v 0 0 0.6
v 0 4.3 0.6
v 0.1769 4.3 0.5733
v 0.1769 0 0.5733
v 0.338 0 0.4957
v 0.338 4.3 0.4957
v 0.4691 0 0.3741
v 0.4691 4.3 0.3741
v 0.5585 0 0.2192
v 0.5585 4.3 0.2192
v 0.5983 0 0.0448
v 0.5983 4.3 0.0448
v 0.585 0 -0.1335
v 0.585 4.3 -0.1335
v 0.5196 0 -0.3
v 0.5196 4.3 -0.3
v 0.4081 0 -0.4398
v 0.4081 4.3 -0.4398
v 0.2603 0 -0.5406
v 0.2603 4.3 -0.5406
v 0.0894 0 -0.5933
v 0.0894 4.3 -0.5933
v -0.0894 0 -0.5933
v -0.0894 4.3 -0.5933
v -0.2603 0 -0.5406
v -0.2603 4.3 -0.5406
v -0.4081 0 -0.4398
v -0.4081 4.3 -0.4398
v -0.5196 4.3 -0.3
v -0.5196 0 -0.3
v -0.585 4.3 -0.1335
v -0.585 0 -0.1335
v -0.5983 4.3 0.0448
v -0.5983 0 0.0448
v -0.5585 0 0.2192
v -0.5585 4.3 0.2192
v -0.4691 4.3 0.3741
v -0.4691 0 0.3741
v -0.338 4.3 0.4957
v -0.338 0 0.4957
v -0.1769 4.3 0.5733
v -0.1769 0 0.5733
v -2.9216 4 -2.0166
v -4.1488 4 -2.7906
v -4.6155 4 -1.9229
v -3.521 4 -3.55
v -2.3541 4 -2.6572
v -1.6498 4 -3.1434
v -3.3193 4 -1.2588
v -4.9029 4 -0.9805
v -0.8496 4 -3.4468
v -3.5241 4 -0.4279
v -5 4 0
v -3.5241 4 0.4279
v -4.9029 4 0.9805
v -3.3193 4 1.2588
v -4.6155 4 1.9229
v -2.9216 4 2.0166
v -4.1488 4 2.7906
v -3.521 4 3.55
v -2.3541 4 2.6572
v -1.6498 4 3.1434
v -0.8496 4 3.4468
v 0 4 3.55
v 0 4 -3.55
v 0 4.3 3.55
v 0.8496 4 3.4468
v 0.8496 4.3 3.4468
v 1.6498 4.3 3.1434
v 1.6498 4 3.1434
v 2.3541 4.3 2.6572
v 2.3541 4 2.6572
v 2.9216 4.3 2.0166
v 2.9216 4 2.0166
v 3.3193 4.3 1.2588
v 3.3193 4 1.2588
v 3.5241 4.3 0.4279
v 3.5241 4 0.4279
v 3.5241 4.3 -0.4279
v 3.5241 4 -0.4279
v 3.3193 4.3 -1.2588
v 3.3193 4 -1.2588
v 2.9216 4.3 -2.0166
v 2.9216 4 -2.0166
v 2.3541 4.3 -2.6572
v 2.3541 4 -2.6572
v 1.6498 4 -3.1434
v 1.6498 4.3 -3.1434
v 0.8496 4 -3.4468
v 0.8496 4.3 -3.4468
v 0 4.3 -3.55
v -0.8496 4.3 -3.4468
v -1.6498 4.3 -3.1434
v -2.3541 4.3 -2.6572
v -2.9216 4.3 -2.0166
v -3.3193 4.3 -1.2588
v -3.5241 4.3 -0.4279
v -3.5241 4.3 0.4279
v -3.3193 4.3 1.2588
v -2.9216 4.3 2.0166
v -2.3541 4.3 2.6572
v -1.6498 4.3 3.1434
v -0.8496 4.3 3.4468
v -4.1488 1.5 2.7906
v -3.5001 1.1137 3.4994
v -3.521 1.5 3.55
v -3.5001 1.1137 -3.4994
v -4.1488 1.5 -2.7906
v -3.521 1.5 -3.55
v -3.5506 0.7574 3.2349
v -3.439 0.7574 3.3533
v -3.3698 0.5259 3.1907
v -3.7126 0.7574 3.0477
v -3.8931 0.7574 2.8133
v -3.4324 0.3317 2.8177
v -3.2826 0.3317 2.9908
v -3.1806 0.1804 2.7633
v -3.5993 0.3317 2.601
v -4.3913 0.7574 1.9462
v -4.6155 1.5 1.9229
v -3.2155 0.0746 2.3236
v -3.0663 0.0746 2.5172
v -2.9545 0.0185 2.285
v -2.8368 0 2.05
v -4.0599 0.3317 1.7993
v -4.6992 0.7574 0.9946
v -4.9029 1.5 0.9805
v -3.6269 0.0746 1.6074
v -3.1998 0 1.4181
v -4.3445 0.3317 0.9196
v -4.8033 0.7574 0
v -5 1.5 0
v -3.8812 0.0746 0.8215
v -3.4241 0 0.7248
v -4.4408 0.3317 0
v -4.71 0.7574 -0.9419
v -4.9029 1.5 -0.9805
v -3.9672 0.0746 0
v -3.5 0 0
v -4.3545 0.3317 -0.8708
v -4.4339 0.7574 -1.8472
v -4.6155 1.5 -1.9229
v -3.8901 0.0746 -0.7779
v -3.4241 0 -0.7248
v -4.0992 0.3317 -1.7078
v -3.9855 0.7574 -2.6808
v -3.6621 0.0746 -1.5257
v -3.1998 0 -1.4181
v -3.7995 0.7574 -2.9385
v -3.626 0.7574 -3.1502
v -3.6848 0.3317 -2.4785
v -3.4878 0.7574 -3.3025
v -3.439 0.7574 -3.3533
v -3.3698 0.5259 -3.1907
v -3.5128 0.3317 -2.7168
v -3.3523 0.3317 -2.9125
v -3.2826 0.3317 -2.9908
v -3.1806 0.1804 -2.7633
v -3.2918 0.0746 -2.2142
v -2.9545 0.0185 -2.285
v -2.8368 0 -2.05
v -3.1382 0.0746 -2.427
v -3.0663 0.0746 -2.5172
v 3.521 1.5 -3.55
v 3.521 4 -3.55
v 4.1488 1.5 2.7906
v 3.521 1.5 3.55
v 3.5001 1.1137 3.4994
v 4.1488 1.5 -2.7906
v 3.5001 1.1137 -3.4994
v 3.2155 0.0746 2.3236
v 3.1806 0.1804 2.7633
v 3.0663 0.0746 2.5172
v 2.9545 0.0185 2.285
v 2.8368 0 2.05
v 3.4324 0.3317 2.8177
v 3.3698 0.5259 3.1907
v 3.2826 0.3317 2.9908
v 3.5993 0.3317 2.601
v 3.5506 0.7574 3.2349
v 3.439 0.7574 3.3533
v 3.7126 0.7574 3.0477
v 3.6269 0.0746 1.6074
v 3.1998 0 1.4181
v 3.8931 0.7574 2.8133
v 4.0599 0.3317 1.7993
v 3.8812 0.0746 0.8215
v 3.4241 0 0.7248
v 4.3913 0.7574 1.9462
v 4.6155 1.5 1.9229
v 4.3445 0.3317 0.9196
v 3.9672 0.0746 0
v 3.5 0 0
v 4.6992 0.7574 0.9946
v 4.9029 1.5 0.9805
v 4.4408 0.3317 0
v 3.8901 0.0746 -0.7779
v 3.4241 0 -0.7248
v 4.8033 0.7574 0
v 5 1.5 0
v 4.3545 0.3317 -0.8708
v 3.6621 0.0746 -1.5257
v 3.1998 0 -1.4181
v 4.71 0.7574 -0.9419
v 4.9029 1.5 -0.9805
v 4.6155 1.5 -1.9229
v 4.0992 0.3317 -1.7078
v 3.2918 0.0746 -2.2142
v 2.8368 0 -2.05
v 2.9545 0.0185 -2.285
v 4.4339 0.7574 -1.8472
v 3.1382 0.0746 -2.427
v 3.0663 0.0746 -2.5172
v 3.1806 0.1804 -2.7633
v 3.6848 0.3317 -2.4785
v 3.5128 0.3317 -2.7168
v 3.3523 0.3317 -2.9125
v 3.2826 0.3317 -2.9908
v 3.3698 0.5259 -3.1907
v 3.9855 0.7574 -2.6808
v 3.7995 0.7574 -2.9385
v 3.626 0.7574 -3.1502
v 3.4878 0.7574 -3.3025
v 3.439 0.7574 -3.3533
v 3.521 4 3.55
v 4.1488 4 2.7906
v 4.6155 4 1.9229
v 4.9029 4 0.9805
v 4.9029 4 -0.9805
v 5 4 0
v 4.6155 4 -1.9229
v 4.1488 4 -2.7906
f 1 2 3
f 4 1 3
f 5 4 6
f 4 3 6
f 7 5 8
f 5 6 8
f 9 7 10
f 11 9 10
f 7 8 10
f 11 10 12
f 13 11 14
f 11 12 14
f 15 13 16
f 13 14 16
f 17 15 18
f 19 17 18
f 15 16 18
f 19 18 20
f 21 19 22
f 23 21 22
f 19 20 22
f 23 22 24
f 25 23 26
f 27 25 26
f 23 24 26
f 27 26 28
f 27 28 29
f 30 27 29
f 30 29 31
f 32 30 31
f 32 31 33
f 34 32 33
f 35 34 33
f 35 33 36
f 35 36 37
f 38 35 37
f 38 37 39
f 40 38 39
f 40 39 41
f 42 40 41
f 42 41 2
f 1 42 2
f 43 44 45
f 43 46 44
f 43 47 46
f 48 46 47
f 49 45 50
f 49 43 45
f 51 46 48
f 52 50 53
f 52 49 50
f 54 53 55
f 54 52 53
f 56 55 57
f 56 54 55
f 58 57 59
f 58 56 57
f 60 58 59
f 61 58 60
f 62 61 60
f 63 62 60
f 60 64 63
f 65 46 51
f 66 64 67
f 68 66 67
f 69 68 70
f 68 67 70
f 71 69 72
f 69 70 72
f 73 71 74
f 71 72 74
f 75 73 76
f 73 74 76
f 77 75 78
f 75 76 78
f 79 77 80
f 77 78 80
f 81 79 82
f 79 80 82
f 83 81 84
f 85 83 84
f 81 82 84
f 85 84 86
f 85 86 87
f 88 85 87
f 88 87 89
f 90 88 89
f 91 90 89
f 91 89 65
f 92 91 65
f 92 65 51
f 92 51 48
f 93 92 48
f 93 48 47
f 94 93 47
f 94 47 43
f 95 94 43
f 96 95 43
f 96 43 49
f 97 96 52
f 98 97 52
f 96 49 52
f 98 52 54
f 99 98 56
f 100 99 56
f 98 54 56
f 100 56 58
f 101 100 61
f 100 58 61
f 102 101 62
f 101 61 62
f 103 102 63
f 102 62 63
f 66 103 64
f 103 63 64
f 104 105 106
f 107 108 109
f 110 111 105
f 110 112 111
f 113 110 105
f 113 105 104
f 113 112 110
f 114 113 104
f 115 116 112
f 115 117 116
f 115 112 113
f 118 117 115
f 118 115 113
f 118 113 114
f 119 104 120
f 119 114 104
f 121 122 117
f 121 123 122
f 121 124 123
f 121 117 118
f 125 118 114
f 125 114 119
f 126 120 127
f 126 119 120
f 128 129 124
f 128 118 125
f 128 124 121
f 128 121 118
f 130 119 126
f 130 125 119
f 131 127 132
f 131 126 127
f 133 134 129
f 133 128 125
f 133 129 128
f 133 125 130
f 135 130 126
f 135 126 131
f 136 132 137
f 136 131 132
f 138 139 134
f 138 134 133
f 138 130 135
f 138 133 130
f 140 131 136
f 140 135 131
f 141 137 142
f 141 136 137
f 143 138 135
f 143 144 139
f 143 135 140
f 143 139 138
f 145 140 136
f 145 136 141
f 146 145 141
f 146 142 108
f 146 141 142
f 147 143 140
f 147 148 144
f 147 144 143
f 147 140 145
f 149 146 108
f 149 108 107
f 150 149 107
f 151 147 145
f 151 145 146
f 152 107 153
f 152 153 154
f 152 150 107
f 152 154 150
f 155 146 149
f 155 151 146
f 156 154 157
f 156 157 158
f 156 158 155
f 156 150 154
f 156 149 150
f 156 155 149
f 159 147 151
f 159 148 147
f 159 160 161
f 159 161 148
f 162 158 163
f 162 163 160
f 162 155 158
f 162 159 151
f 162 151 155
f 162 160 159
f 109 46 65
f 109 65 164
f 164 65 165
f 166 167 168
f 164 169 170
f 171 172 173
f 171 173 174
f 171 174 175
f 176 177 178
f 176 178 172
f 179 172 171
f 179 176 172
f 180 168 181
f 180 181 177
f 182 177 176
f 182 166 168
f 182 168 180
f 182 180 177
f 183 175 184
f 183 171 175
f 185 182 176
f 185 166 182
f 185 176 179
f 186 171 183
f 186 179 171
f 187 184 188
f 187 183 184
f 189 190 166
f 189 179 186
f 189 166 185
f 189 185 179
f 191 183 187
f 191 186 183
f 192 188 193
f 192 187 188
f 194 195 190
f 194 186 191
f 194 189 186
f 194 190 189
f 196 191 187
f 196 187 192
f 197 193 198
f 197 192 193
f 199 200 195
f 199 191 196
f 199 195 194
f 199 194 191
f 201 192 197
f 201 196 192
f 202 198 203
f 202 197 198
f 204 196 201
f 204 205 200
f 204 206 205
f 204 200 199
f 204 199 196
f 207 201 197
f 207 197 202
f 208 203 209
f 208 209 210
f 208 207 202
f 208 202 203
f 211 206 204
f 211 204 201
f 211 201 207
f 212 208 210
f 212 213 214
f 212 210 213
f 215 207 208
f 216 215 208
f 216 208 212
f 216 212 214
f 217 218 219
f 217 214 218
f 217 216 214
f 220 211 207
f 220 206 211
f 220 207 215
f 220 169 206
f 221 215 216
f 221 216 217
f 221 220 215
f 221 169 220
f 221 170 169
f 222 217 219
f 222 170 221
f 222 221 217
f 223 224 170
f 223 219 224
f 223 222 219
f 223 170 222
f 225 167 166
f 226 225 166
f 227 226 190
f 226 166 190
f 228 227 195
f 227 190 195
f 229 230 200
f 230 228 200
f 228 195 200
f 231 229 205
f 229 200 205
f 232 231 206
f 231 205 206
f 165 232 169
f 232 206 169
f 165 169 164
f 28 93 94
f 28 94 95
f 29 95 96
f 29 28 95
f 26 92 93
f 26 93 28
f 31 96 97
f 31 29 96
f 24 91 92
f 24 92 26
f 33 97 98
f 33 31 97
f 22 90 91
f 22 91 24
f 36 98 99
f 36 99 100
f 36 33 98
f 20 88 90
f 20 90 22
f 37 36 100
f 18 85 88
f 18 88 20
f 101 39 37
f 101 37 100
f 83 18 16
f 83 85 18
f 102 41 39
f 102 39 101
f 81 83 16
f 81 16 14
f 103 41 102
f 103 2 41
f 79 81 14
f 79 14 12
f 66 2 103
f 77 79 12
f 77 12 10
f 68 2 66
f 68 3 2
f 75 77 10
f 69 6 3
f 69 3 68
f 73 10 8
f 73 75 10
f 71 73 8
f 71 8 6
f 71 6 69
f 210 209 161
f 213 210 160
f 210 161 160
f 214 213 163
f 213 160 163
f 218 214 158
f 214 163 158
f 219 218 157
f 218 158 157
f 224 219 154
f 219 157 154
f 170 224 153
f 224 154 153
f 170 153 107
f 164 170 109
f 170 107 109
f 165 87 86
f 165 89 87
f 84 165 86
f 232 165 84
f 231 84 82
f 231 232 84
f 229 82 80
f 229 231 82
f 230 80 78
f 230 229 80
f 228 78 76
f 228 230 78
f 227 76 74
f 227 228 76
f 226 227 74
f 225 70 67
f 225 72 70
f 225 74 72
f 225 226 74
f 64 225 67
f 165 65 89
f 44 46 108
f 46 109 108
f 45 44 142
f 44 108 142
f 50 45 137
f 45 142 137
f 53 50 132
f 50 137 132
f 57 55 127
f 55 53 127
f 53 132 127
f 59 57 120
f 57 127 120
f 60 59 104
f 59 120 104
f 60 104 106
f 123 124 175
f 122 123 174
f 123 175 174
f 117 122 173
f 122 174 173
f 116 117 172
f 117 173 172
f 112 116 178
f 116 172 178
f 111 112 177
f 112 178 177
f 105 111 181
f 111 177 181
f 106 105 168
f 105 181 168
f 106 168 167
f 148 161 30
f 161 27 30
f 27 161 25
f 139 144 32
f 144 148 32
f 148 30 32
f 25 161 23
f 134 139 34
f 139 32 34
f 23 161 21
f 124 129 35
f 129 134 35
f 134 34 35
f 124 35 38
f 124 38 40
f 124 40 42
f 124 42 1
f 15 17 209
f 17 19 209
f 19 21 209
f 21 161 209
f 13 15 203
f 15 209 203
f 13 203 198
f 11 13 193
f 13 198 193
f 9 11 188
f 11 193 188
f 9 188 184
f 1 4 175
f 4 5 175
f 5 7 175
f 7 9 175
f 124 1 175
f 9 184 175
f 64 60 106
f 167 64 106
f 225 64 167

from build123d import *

# Parameters (mm, degrees)
SKETCH_1_R           = 5
EXTRUDE_1_DEPTH      = 4
SKETCH_2_R           = 3.55
EXTRUDE_2_DEPTH      = 0.3
SKETCH_3_R           = 0.6
CUT_EXTRUDE_1_DEPTH  = 9.275868534
SKETCH_4_OUTSIDE_W   = 14.956
SKETCH_4_OUTSIDE_H   = 14.956
SKETCH_4_OUTSIDE_W_2 = 10
SKETCH_4_OUTSIDE_H_2 = 7.1
CUT_EXTRUDE_2_DEPTH  = 9.124038405
FILLET_1_R           = 1.5


with BuildPart() as part:
    # 草图1 → 凸台-拉伸1 (new body)
    with BuildSketch(Plane(origin=(0, 0, 0), x_dir=(1, 0, 0), z_dir=(0, 1, 0))):
        with Locations(Location((0, 0, 0), (0, 0, 270))):
            Circle(SKETCH_1_R)
    extrude(amount=EXTRUDE_1_DEPTH)

    # 草图2 → 凸台-拉伸2 (add)
    with BuildSketch(Plane(origin=(0, 4, 0), x_dir=(1, 0, 0), z_dir=(0, 1, 0))):
        with Locations(Location((0, 0, 0), (0, 0, 270))):
            Circle(SKETCH_2_R)
    extrude(amount=EXTRUDE_2_DEPTH)

    # 草图3 → 切除-拉伸1 (cut, through all)
    with BuildSketch(Plane(origin=(0, 4.3, 0), x_dir=(1, 0, 0), z_dir=(0, 1, 0))):
        with Locations(Location((0, 0, 0), (0, 0, 270))):
            Circle(SKETCH_3_R)
    extrude(amount=-CUT_EXTRUDE_1_DEPTH, mode=Mode.SUBTRACT)

    # 草图4 outside → 切除-拉伸2 (cut, through all)
    with BuildSketch(Plane(origin=(0, 4, 0), x_dir=(1, 0, 0), z_dir=(0, 1, 0))):
        Rectangle(SKETCH_4_OUTSIDE_W, SKETCH_4_OUTSIDE_H)
        Rectangle(SKETCH_4_OUTSIDE_W_2, SKETCH_4_OUTSIDE_H_2, mode=Mode.SUBTRACT)
    extrude(amount=-CUT_EXTRUDE_2_DEPTH, mode=Mode.SUBTRACT)

    # 圆角1
    # the kernel refuses this fillet: 1.5 mm, written as the material it takes off along each edge
    with BuildSketch(Plane(origin=(0, 0, 0), x_dir=(-0.03098871975283517, 0, 0.9995197342964671), z_dir=(0.9995197342964671, 0, 0.03098871975283517))) as fillet_1_piece_1:
        with BuildLine():
            CenterArc((5 - FILLET_1_R, -FILLET_1_R), FILLET_1_R, 0, 90)
            Line((5 - FILLET_1_R, 0), (5, 0))
            Line((5, 0), (5, -FILLET_1_R))
        make_face()
    revolve(axis=Axis((0, 0, 0), (0, -1, 0)), revolution_arc=176.4483857, mode=Mode.SUBTRACT)
    with BuildSketch(Plane(origin=(-7.271008378, 0, -3.55), x_dir=(0, 1, 0), z_dir=(1, 0, 0)), Plane(origin=(7.271008378, 0, 3.55), x_dir=(0, 1, 0), z_dir=(-1, 0, 0))) as fillet_1_piece_2:
        with BuildLine():
            CenterArc((FILLET_1_R, FILLET_1_R), FILLET_1_R, 180, 90)
            Line((0, FILLET_1_R), (0, 0))
            Line((0, 0), (FILLET_1_R, 0))
        make_face()
    extrude(amount=14.542016757, mode=Mode.SUBTRACT)
    with BuildSketch(Plane(origin=(0, 0, 0), x_dir=(0.030988719752834452, 0, 0.9995197342964671), z_dir=(-0.9995197342964671, 0, 0.030988719752834452))) as fillet_1_piece_3:
        with BuildLine():
            CenterArc((5 - FILLET_1_R, FILLET_1_R), FILLET_1_R, 270, 90)
            Line((5 - FILLET_1_R, 0), (5, 0))
            Line((5, 0), (5, FILLET_1_R))
        make_face()
    revolve(axis=Axis((0, 0, 0), (0, 1, 0)), revolution_arc=176.4483857, mode=Mode.SUBTRACT)


solid = part.part
